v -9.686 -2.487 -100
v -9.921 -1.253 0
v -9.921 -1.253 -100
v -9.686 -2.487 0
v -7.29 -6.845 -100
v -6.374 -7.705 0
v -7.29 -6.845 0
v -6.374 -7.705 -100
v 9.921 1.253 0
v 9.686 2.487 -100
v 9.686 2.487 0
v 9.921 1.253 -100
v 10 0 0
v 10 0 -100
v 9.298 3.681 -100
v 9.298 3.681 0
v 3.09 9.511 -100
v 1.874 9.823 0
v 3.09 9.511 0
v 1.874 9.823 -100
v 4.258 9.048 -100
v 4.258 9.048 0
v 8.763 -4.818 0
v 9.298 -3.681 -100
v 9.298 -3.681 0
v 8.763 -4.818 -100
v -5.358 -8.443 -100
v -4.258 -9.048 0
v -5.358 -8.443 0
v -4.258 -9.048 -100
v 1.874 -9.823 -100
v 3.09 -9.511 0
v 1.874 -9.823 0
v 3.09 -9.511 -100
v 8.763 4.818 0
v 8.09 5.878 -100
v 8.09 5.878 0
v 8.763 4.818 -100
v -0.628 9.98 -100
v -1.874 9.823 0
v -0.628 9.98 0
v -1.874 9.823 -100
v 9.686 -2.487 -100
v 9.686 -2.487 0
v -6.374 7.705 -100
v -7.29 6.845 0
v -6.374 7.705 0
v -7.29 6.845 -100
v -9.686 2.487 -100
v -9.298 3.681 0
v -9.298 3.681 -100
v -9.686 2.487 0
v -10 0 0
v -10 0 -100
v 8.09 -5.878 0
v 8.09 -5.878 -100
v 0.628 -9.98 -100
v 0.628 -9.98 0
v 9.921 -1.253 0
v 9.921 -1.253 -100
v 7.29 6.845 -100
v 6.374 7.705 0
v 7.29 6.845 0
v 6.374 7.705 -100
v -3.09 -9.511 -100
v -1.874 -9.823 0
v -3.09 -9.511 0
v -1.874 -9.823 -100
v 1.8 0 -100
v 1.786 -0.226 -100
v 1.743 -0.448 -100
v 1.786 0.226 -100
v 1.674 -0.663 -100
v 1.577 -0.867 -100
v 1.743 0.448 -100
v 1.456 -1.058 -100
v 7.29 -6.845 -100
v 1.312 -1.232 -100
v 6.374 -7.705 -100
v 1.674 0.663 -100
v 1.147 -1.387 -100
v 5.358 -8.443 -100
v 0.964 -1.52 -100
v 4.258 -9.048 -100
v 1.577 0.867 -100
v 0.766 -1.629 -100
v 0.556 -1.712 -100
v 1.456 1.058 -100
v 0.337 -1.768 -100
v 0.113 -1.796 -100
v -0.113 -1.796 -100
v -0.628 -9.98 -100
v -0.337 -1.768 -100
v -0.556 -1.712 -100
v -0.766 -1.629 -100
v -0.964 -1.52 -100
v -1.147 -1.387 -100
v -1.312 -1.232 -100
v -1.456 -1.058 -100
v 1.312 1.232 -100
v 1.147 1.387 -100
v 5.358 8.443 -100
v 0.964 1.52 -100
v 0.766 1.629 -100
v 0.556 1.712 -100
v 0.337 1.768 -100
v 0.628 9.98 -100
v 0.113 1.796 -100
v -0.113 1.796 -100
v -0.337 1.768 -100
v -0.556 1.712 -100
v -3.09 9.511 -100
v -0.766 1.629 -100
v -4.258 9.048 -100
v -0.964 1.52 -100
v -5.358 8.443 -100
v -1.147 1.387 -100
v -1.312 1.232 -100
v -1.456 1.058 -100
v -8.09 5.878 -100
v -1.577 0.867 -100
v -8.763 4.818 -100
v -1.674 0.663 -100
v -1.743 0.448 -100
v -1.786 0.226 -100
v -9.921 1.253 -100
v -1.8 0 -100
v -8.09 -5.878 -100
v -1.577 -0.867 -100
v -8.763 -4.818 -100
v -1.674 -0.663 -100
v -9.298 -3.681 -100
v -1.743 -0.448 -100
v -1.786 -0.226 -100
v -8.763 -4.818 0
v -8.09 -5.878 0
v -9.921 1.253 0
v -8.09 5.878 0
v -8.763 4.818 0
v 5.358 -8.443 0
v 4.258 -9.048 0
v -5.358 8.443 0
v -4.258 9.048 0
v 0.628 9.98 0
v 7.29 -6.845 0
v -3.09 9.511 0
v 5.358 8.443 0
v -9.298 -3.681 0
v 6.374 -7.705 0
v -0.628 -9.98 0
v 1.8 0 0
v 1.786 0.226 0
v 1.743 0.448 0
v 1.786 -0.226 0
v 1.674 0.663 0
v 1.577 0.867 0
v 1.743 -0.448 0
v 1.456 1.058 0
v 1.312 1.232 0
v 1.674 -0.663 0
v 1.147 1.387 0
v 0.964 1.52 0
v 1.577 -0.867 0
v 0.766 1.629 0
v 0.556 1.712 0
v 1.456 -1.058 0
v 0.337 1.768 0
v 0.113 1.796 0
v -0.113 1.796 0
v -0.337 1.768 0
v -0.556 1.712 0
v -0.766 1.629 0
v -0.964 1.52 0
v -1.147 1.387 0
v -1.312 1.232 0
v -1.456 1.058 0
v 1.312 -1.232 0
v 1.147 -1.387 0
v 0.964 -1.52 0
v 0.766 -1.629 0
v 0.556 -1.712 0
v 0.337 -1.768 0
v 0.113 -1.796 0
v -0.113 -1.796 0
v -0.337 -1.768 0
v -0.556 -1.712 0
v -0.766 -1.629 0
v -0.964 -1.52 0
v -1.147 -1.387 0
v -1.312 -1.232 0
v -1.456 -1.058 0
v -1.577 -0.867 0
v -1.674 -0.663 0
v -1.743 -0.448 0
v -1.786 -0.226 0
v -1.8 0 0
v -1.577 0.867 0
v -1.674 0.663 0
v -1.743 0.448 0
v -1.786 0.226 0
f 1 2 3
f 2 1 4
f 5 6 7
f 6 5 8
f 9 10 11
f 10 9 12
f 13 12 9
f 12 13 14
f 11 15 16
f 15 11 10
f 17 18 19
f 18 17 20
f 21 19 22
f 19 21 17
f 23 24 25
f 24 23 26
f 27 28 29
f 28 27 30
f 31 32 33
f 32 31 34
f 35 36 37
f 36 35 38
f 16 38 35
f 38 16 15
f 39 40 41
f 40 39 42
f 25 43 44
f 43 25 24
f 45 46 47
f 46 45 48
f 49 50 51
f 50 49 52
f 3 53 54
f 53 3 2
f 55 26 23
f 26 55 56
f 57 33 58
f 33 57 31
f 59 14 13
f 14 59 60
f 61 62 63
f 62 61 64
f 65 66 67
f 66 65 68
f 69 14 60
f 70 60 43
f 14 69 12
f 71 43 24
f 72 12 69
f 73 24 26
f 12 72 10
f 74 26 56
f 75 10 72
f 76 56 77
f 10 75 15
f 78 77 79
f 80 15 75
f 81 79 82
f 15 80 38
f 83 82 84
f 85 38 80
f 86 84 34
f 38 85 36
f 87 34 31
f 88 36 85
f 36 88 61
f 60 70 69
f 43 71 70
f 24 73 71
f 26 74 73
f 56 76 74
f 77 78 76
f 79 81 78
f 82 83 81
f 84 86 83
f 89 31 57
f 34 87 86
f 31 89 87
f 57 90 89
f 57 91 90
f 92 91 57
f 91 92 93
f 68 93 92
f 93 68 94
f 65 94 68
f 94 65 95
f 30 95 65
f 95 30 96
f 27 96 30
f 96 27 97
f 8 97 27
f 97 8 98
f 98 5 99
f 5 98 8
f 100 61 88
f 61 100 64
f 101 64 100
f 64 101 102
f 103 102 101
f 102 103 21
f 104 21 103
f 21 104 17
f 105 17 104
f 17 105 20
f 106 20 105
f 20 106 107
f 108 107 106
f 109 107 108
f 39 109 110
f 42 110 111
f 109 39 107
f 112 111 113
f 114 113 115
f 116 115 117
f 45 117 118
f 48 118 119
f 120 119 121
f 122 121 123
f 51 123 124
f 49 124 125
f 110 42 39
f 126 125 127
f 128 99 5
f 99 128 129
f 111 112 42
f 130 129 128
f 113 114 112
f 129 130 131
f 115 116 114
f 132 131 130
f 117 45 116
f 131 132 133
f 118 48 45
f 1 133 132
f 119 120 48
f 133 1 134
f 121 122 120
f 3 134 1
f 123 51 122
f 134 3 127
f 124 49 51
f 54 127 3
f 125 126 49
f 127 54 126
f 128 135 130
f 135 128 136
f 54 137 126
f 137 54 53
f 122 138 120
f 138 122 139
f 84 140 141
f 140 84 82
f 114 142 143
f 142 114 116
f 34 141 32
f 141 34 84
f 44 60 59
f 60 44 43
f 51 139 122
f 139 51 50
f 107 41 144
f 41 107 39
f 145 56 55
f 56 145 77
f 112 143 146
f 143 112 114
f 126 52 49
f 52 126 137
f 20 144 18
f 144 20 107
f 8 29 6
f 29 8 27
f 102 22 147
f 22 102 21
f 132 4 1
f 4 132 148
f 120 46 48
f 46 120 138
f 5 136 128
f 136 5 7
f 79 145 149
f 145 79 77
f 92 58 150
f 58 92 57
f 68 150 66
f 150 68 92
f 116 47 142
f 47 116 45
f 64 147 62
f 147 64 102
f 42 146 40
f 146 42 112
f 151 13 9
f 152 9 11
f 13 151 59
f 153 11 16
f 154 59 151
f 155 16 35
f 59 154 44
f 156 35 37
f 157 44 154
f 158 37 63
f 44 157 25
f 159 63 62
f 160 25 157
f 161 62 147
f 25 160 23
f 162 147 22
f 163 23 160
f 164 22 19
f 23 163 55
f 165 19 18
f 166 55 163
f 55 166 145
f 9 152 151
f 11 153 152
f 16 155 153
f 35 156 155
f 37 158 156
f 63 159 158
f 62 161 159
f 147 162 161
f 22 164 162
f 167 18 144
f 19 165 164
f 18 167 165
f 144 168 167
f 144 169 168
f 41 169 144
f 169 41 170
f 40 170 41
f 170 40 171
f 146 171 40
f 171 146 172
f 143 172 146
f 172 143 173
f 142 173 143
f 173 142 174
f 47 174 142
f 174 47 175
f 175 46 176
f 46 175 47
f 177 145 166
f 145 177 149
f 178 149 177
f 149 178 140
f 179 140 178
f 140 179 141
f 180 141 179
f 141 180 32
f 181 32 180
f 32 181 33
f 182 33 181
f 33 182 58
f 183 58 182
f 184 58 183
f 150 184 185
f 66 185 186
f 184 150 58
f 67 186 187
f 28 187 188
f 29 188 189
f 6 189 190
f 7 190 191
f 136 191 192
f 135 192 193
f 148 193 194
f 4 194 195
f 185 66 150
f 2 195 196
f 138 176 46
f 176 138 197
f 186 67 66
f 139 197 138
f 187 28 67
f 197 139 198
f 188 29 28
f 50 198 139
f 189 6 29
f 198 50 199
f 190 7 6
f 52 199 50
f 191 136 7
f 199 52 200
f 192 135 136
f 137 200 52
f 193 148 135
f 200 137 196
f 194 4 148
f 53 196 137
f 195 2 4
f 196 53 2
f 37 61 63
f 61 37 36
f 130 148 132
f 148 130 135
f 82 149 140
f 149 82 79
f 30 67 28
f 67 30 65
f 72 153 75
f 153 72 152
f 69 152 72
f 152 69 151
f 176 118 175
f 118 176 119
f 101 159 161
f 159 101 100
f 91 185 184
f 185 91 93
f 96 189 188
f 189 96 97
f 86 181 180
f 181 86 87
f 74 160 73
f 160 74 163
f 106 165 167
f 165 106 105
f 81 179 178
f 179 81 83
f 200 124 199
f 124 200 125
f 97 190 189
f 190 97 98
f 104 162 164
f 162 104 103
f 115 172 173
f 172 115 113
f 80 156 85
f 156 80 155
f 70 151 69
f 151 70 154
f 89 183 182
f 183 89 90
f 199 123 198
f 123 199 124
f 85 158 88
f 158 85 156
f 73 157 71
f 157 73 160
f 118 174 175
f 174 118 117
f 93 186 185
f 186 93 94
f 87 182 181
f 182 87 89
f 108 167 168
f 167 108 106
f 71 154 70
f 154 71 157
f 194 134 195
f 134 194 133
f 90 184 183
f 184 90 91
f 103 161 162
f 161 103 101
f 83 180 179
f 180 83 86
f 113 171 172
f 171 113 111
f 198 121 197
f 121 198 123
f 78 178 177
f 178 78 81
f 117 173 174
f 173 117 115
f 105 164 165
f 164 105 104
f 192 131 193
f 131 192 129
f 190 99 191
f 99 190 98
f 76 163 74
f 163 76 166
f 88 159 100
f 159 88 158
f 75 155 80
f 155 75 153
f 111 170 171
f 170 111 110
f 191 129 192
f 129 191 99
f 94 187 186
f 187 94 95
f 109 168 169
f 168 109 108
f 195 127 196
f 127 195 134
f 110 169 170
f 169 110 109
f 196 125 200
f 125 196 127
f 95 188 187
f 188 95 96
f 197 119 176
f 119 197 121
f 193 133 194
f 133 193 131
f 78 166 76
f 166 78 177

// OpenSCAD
$fn = 50;


difference() {
	union() {
		translate(v = [0, 0, -100.0000000000]) {
			cylinder(h = 100, r = 10.0000000000);
		}
		cylinder(h = 0, r = 19.0000000000);
	}
	union() {
		#translate(v = [0, 0, -100]) {
			cylinder(h = 100, r = 1.8000000000);
		}
	}
}
